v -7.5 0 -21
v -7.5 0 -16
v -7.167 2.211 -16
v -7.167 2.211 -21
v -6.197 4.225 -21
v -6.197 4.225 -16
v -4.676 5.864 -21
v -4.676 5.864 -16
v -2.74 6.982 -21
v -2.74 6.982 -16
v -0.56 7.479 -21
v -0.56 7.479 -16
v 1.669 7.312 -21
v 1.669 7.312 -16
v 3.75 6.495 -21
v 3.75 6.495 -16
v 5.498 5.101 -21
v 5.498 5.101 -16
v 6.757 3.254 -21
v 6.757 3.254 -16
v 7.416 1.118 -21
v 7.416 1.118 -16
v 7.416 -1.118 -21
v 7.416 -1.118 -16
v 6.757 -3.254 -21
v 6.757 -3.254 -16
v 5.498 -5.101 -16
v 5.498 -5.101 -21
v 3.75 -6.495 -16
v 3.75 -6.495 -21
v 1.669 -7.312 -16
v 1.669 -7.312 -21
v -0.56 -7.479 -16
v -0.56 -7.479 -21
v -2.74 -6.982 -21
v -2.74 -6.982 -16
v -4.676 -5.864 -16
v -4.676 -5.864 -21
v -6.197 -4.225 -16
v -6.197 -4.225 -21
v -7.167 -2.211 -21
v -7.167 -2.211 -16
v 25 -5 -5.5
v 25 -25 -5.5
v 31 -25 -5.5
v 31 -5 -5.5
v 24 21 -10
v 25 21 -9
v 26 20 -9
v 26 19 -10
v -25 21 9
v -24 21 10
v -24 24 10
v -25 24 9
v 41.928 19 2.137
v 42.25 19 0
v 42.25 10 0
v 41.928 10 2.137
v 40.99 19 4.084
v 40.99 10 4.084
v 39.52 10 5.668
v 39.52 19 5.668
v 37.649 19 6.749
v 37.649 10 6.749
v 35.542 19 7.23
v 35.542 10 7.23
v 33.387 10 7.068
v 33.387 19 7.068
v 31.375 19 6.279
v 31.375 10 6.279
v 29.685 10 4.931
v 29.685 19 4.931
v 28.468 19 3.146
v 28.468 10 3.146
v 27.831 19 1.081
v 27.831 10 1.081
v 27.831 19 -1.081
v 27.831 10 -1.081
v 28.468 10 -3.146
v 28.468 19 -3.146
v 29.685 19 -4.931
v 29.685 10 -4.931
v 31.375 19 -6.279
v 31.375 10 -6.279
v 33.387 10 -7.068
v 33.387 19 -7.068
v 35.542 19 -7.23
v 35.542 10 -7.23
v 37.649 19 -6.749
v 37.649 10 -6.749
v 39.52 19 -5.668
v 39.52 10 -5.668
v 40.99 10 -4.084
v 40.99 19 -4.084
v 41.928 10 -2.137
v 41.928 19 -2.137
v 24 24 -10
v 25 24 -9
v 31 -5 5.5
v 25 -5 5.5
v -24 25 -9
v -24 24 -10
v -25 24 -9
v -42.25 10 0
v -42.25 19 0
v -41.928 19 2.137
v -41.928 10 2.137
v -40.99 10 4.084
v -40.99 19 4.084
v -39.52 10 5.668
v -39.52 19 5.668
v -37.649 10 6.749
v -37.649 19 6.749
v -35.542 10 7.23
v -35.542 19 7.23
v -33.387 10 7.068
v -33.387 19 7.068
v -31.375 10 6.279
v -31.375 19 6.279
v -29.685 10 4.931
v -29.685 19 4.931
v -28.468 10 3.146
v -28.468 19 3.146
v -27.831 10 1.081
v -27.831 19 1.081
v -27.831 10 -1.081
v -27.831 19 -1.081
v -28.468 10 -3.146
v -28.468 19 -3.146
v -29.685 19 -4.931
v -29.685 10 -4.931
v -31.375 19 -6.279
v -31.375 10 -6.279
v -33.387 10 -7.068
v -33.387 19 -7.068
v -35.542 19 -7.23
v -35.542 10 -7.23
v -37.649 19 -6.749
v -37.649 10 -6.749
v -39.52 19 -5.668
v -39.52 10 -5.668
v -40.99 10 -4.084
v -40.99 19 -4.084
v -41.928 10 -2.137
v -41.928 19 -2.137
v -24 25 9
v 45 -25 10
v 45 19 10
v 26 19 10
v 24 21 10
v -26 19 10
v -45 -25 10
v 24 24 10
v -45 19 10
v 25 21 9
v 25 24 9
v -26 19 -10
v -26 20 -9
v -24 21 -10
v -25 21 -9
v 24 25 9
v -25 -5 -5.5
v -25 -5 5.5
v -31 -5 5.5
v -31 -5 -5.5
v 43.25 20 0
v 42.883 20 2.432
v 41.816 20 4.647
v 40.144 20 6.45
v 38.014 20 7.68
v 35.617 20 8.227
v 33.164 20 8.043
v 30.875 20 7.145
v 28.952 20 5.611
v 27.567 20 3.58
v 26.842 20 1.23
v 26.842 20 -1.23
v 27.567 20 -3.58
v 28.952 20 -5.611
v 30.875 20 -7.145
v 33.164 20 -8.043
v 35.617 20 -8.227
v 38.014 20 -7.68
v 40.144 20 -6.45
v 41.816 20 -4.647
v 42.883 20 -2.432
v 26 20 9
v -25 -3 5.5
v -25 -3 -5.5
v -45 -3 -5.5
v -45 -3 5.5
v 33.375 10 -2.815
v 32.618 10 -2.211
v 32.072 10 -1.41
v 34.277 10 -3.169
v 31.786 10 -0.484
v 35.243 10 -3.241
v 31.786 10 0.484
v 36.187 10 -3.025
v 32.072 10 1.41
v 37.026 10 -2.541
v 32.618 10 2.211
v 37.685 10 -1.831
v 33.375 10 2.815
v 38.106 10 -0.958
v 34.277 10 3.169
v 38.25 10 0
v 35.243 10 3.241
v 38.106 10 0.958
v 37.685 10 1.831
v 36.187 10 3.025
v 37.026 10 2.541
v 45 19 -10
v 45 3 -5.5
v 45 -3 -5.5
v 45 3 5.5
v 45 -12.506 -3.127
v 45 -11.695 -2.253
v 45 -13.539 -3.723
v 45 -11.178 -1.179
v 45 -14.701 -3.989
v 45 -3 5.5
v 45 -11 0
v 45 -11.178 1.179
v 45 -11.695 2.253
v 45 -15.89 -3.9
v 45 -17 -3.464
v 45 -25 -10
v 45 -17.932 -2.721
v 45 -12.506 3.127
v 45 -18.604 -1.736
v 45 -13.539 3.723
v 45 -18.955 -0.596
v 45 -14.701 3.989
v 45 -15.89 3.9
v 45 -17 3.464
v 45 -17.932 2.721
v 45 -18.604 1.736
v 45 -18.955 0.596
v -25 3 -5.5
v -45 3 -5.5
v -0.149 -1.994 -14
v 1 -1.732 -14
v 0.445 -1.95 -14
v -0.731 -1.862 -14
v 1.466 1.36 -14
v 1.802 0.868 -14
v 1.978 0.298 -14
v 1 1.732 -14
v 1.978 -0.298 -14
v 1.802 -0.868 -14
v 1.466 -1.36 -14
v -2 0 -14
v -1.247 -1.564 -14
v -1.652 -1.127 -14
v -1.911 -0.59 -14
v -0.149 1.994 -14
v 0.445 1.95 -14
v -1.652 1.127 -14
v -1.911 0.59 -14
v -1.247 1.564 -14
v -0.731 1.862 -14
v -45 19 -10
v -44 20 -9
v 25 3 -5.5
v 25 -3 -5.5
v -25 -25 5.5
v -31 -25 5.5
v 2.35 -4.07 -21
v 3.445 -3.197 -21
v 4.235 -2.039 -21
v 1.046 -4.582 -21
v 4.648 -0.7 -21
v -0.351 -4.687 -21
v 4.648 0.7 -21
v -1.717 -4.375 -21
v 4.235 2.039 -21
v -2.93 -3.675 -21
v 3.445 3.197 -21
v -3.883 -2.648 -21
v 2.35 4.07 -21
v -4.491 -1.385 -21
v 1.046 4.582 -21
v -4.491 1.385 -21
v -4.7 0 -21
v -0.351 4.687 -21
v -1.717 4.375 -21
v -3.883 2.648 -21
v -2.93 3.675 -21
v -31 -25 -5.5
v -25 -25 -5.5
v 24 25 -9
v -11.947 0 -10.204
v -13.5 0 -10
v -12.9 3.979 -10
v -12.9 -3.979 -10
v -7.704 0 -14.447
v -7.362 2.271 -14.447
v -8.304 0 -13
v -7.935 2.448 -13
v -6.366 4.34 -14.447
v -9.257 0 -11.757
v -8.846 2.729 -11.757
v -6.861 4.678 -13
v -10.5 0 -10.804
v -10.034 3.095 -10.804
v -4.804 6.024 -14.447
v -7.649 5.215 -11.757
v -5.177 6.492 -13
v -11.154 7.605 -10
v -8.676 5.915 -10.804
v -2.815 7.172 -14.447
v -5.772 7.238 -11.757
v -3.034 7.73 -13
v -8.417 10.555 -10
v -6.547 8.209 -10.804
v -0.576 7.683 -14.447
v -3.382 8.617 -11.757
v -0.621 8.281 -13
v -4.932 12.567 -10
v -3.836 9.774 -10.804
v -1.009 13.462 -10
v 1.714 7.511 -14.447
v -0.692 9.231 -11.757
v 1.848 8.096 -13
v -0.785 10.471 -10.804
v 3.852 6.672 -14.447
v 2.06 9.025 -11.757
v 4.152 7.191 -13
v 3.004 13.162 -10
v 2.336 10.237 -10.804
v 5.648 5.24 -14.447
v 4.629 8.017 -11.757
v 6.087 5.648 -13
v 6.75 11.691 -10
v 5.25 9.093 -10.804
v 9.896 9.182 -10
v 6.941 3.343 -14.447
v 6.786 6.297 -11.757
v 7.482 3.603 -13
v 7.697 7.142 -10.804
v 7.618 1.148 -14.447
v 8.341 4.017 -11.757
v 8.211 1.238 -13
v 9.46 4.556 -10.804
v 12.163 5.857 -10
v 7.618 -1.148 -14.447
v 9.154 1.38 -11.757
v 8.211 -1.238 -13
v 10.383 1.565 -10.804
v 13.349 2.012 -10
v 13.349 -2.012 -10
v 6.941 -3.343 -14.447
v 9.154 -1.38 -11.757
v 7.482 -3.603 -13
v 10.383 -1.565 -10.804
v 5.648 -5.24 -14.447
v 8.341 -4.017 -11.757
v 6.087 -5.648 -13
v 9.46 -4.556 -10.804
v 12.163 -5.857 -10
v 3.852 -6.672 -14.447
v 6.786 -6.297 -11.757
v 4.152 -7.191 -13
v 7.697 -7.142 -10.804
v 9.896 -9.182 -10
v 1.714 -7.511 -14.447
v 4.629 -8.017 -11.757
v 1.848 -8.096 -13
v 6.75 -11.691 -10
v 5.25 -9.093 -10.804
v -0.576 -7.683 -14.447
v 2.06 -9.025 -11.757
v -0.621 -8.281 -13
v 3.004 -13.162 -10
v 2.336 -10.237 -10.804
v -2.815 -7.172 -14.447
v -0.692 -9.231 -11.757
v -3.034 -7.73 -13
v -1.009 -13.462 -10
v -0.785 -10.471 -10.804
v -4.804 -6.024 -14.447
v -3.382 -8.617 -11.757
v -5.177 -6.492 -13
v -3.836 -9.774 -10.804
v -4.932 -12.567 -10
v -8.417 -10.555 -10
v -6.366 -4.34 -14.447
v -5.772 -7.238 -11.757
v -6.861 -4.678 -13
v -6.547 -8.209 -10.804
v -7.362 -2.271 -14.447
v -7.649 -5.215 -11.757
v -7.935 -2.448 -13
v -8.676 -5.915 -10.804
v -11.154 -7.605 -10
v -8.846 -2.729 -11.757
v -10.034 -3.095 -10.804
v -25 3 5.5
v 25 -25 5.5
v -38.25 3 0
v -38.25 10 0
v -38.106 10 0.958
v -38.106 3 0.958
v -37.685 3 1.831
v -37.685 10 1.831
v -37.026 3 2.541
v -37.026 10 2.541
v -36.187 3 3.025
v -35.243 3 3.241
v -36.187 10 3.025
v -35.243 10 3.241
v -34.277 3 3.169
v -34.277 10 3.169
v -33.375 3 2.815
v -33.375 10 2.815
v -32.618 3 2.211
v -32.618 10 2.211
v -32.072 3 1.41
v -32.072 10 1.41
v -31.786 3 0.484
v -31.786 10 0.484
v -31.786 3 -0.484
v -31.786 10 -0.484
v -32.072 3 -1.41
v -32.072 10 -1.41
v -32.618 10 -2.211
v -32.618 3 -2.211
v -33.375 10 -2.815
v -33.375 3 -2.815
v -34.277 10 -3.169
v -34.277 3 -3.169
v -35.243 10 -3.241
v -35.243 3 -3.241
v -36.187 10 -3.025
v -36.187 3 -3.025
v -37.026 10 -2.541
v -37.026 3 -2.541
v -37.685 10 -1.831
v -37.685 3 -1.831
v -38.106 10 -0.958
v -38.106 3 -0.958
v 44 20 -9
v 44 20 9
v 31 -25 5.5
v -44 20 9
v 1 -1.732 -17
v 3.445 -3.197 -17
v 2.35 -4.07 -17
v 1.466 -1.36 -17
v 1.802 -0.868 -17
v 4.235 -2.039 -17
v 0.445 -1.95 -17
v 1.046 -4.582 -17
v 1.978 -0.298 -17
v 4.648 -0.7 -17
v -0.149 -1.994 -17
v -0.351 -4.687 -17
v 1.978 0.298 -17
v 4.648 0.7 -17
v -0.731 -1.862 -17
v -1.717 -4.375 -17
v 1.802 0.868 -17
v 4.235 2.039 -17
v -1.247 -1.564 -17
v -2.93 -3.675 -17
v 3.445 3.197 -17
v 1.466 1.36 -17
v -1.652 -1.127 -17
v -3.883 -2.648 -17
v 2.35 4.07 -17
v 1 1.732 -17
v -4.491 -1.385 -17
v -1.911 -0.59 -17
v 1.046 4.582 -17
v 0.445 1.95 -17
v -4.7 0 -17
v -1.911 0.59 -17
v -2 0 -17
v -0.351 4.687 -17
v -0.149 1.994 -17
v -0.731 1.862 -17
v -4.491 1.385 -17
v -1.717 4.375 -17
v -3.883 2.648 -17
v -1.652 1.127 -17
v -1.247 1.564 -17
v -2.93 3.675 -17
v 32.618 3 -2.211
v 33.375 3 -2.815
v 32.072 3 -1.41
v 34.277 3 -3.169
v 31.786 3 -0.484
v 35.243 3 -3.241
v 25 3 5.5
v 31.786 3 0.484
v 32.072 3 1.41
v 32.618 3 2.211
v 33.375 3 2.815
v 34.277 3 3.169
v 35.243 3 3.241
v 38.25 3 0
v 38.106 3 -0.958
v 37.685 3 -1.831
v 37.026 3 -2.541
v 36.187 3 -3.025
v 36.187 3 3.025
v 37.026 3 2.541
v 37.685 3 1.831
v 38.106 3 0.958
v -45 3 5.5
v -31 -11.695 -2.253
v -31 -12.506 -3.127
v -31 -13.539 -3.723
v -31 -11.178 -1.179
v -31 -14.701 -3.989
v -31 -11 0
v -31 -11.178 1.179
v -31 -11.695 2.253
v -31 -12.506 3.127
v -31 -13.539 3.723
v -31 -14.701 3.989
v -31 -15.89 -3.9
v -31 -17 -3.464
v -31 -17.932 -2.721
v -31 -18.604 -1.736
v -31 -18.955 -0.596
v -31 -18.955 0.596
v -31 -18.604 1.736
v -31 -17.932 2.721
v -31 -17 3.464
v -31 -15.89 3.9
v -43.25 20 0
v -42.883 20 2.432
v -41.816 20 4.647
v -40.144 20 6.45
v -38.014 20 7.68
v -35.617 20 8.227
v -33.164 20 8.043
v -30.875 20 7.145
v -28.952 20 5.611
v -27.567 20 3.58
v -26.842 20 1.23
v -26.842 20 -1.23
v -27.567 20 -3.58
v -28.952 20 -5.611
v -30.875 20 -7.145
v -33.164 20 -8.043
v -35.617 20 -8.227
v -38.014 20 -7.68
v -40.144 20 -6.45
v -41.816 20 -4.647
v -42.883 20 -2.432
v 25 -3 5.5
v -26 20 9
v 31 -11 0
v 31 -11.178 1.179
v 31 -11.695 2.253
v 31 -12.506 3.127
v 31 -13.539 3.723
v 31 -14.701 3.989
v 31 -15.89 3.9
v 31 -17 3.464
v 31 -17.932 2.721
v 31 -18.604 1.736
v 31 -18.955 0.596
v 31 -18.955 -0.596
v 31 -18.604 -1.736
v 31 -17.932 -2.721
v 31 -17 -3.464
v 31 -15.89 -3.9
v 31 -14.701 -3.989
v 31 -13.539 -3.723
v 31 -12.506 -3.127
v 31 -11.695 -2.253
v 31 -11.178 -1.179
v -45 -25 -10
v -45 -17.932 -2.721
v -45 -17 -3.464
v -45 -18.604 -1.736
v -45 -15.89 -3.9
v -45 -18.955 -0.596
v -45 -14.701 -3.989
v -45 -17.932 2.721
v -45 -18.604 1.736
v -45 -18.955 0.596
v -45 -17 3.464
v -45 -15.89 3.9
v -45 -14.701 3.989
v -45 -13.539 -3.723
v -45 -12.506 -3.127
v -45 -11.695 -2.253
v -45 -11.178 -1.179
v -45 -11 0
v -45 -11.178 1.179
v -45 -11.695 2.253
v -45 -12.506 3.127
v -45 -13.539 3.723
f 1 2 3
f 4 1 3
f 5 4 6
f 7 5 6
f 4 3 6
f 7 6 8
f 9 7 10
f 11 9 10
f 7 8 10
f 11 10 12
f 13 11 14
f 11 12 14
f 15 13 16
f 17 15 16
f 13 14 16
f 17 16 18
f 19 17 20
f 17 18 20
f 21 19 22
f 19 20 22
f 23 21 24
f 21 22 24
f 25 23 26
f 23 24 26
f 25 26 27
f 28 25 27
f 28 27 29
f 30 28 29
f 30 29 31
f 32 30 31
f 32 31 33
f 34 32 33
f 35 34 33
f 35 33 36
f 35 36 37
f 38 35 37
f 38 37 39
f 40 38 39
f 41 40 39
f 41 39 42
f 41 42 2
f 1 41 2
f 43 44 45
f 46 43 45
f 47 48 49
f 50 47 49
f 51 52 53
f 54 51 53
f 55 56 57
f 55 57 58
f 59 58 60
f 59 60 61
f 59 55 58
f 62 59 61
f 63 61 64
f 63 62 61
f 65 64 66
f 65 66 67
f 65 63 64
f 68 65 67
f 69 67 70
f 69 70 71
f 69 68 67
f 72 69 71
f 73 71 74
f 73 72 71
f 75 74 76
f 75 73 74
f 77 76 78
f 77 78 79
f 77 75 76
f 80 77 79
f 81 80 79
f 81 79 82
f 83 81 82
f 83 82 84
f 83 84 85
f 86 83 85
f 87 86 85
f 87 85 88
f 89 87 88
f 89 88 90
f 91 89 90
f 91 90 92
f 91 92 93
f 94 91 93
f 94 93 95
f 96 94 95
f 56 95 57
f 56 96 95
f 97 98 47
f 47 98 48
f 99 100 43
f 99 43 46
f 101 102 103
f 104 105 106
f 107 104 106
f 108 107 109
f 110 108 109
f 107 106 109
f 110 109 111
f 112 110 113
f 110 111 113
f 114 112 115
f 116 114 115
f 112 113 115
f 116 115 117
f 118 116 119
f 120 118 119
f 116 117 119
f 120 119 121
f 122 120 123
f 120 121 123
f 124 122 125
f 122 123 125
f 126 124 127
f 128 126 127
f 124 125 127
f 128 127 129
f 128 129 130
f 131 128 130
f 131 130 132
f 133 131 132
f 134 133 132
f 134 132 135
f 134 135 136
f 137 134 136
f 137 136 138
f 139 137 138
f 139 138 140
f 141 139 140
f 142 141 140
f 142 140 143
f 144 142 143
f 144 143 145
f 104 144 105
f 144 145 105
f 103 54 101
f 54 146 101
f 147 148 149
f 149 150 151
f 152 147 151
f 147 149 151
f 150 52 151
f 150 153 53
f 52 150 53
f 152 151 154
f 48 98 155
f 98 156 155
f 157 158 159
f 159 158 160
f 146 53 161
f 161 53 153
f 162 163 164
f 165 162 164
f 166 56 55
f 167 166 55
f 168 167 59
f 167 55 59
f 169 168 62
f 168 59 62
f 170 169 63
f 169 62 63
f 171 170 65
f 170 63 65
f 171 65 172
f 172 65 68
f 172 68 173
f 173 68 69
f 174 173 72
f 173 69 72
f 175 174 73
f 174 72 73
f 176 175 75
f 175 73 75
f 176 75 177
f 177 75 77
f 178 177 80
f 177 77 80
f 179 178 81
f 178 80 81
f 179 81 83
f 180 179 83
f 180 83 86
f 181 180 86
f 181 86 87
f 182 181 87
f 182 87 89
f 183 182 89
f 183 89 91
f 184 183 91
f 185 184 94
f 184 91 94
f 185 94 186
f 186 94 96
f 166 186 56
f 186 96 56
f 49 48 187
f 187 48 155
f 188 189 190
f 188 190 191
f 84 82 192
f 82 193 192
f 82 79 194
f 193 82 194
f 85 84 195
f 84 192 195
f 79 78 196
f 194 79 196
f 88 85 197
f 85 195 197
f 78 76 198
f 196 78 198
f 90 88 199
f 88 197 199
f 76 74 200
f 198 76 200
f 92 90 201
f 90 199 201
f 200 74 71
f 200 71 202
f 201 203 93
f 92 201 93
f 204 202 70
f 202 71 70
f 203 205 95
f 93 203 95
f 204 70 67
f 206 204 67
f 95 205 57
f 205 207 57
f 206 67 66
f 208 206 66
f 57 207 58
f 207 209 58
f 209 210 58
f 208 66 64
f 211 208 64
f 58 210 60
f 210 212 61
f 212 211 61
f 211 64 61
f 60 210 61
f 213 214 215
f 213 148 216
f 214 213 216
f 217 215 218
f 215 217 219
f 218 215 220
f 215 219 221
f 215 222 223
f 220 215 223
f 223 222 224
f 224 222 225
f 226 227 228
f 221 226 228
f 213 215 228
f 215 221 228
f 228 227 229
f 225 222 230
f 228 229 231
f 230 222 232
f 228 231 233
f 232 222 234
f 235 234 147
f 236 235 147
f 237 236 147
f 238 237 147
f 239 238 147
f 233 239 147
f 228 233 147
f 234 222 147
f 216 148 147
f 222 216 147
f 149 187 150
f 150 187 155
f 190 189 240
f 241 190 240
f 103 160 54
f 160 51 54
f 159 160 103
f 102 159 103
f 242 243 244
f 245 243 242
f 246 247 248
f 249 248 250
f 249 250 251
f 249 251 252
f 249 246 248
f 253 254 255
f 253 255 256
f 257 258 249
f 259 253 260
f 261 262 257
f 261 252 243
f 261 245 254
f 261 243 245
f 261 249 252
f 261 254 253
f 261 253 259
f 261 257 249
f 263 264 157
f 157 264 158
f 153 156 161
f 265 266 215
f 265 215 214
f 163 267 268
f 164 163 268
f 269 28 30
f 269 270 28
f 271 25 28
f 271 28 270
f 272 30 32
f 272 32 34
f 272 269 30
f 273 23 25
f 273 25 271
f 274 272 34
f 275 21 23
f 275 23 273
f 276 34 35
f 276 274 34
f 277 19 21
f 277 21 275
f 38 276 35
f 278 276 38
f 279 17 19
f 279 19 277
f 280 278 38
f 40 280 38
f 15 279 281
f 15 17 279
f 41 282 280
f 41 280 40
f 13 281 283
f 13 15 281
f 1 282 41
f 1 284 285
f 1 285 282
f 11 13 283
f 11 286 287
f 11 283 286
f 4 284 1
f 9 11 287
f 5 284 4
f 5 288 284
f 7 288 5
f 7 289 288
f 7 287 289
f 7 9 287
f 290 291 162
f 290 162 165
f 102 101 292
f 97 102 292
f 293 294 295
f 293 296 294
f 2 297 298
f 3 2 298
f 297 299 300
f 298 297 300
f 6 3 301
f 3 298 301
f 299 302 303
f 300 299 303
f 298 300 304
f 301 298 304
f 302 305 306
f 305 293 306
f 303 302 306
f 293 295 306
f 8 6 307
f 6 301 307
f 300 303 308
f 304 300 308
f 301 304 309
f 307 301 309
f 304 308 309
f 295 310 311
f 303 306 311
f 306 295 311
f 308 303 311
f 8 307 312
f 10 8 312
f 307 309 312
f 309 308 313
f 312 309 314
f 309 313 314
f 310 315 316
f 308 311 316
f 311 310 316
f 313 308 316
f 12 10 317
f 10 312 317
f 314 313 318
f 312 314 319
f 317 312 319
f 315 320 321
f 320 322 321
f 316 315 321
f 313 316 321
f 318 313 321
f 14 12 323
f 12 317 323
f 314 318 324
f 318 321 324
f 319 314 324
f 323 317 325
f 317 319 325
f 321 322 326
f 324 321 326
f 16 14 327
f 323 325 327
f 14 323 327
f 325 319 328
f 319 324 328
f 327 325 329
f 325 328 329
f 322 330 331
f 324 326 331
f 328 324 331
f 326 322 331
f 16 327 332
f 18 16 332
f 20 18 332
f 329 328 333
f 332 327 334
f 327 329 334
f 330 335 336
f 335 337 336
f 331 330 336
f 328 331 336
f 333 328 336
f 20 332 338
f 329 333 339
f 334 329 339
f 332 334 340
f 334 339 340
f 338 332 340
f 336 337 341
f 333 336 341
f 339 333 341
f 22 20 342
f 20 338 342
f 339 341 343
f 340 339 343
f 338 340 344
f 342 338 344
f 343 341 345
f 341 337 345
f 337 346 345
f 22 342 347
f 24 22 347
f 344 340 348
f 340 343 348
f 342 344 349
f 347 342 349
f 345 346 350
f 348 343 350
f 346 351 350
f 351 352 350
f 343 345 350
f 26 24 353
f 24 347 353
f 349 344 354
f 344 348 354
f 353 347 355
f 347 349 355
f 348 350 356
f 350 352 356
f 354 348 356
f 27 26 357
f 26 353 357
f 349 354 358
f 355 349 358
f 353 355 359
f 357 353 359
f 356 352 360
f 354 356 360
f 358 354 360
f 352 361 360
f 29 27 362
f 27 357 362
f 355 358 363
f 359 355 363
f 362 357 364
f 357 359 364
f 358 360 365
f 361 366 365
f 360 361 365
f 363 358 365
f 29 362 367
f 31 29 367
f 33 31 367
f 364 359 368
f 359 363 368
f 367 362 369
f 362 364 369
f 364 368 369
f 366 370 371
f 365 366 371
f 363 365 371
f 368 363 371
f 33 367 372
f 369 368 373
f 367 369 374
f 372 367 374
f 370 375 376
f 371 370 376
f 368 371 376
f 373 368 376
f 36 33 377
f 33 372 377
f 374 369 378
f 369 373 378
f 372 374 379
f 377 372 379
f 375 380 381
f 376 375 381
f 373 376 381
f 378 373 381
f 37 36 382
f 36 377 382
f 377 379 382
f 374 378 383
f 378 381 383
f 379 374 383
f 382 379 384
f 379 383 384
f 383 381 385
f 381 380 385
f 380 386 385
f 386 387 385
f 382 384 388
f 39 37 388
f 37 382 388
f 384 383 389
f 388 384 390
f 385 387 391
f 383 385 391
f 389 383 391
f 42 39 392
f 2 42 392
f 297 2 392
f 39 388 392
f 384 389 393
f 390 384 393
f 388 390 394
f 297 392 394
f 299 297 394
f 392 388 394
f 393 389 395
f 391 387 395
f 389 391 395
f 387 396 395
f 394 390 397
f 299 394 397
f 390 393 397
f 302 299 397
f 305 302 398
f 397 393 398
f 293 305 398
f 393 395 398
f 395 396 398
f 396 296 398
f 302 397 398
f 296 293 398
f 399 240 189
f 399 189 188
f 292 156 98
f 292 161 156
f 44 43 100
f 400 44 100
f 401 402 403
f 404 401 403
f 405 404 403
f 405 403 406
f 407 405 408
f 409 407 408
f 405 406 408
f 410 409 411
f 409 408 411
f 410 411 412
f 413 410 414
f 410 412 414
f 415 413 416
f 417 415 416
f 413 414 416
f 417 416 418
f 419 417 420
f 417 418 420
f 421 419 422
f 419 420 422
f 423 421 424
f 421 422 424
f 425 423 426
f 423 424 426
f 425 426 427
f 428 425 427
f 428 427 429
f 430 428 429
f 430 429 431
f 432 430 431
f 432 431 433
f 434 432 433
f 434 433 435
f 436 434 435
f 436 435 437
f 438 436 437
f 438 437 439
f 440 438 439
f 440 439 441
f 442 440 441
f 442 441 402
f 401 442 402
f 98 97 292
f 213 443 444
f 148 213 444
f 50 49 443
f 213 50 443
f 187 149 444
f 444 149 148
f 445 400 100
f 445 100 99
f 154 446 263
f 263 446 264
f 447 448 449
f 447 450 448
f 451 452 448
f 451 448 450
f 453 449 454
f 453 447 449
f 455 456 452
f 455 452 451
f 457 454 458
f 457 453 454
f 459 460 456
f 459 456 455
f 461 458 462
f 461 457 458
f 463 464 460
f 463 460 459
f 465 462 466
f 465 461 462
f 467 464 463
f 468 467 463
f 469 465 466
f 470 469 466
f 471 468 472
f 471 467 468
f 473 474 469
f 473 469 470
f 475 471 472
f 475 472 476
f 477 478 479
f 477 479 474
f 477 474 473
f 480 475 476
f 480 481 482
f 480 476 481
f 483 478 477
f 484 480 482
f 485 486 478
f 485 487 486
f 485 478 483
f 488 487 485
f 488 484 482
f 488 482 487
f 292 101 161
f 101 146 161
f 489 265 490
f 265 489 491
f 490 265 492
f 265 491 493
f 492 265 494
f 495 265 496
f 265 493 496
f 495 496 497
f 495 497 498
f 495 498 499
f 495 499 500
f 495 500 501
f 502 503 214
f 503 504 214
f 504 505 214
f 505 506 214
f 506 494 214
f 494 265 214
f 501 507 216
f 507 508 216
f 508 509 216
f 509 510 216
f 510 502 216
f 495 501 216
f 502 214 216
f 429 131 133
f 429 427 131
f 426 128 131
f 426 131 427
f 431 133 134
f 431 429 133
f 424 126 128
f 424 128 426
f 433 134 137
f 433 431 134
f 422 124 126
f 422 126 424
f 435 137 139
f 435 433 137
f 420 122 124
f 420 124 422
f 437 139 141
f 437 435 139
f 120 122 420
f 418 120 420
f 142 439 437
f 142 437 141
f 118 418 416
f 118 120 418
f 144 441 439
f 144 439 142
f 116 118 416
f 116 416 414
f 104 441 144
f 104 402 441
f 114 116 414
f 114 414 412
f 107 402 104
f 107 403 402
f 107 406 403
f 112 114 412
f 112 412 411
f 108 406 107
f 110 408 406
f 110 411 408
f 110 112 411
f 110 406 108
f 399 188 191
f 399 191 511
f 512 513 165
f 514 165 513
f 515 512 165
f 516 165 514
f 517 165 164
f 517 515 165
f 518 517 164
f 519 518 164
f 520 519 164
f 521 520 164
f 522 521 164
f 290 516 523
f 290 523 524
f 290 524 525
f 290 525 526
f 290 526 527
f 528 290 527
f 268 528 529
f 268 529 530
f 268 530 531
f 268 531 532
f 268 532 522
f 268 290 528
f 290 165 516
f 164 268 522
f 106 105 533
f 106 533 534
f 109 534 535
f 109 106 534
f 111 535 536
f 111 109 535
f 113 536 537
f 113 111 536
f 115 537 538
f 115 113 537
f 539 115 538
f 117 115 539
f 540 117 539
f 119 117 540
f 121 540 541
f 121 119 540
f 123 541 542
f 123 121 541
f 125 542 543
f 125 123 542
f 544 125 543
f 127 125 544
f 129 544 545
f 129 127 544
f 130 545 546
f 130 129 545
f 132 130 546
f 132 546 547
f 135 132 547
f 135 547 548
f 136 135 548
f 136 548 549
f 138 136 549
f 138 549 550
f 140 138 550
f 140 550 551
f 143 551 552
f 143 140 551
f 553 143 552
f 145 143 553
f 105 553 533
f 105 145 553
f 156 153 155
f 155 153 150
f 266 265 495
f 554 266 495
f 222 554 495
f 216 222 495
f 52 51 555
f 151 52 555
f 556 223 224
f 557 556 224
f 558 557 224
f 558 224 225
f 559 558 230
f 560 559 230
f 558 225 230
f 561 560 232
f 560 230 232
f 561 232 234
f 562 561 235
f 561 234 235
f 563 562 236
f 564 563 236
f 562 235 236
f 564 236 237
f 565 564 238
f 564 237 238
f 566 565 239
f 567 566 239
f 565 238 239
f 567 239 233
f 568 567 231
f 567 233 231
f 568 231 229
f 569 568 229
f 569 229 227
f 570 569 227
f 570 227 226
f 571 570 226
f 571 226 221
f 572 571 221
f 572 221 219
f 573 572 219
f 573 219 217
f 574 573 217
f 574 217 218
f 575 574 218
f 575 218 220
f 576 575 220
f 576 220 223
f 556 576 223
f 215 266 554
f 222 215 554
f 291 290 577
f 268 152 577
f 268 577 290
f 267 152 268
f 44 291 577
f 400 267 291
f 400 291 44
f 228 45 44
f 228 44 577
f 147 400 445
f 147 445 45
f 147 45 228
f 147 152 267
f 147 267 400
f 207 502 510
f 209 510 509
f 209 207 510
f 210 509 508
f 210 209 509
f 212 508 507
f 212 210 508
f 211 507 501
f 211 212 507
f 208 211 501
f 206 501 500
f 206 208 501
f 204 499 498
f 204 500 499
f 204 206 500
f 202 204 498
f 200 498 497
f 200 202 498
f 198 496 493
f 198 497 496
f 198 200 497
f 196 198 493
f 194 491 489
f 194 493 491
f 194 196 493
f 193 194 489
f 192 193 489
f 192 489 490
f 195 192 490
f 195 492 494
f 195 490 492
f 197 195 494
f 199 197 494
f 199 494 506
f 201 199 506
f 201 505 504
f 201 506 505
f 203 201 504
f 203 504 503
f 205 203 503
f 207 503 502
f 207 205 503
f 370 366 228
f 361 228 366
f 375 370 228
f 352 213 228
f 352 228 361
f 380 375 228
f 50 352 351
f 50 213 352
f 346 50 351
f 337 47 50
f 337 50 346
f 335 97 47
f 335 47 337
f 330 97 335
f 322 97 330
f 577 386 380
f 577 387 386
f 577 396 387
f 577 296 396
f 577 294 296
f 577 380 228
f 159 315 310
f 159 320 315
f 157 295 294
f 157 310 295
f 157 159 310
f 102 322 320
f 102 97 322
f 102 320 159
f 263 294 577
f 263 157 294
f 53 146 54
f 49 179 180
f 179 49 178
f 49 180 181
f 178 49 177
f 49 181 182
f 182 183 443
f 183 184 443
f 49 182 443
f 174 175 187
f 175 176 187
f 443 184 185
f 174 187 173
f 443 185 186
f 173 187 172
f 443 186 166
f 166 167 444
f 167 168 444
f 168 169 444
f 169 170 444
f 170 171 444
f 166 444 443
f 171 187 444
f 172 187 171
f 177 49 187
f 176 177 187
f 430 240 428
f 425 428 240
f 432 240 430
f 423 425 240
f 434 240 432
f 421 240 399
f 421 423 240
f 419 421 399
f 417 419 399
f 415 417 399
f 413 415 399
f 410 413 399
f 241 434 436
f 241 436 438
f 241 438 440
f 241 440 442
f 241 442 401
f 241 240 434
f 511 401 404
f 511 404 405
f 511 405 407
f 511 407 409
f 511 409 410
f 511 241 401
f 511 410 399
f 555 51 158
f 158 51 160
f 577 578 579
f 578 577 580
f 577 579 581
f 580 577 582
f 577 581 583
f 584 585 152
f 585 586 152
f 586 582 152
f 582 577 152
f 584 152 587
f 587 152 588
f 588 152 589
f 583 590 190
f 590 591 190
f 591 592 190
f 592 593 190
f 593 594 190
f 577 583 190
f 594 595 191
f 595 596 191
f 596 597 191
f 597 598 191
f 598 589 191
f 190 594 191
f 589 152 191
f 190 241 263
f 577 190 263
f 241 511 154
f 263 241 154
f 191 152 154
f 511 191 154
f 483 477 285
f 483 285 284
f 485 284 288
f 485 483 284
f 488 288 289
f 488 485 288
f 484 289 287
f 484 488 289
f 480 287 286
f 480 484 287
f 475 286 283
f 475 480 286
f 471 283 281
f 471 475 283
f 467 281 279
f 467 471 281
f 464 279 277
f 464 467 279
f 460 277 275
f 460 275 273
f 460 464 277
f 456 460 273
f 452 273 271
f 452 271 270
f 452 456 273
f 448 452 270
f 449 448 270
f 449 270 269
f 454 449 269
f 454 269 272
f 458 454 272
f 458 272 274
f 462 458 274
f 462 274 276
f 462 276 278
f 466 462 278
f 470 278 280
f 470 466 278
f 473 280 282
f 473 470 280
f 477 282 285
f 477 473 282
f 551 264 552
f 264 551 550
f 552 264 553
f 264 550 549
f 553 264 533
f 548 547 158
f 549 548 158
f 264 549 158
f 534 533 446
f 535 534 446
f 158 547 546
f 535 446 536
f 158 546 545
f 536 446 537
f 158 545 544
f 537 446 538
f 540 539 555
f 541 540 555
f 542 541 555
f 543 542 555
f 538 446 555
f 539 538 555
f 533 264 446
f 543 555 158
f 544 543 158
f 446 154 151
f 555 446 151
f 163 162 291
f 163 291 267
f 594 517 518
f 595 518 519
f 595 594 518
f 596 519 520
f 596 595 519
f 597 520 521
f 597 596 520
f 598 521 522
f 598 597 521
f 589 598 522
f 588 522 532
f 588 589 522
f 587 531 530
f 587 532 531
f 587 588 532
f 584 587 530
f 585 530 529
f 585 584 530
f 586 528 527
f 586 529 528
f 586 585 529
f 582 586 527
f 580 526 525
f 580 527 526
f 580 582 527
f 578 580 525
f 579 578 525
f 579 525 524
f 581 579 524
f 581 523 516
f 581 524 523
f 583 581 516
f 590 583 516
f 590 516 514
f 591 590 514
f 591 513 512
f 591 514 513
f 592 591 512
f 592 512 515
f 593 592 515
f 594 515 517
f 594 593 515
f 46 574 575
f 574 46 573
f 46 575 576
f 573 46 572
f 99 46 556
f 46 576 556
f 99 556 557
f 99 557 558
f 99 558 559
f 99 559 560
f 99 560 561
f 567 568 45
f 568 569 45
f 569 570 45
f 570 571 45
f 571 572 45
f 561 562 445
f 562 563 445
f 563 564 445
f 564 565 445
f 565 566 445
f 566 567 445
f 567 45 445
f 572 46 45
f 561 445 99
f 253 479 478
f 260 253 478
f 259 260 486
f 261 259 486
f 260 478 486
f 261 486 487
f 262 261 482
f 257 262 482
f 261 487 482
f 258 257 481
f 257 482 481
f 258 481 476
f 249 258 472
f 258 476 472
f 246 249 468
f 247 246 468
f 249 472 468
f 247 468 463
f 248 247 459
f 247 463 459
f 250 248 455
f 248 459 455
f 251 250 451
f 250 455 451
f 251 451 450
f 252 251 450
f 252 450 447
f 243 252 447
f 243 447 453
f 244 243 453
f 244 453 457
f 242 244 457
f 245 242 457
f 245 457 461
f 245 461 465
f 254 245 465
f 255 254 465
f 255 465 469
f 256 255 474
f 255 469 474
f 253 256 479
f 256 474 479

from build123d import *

# Parameters (mm, degrees)
BODY_DEPTH             = 10
SKETCH14_R             = 7.5
BEARING_SUPPORT_DEPTH  = 7
SKETCH15_R             = 7.5
SKETCH15_R_2           = 4.7
BEARING_PLACE_DEPTH    = 4
SKETCH16_R             = 2
MOTOR_SHAFT_HOLE_DEPTH = 3
FILLET1_R              = 6
SKETCH17_R             = 7.25
SPRING_HOLE_DEPTH      = 10
SKETCH18_W             = 11
SKETCH18_H             = 6
NUT_HOLE_DEPTH         = 20
SKETCH19_R             = 3.25
SHAFT_HOLE_DEPTH       = 13
SKETCH20_R             = 4
BRAKE_SCREW_HOLE_DEPTH = 20
SKETCH21_W             = 6
SKETCH21_H             = 11
BRAKE_NUT_HOLE_DEPTH   = 20
CHAMFER1_SIZE          = 1


with BuildPart() as part:
    # Sketch1 → Body (new, symmetric)
    with BuildSketch(Plane.XY):
        Polygon((25, -25), (-25, -25), (-45, -25), (-45, 20), (-25, 20), (-25, 25), (25, 25), (25, 20), (45, 20), (45, -25), align=None)
    extrude(amount=BODY_DEPTH, both=True)

    # Sketch14 → Bearing_Support (add)
    with BuildSketch(Plane(origin=(0, 0, -10), x_dir=(-1, 0, 0), z_dir=(0, 0, -1))):
        Circle(SKETCH14_R)
    extrude(amount=BEARING_SUPPORT_DEPTH)

    # Sketch15 → Bearing_Place (add)
    with BuildSketch(Plane(origin=(0, 0, -17), x_dir=(-1, 0, 0), z_dir=(0, 0, -1))):
        Circle(SKETCH15_R)
        Circle(SKETCH15_R_2, mode=Mode.SUBTRACT)
    extrude(amount=BEARING_PLACE_DEPTH)

    # Sketch16 → Motor_Shaft_Hole (cut)
    with BuildSketch(Plane(origin=(0, 0, -17), x_dir=(-1, 0, 0), z_dir=(0, 0, -1))):
        Circle(SKETCH16_R)
    extrude(amount=-MOTOR_SHAFT_HOLE_DEPTH, mode=Mode.SUBTRACT)

    # Fillet1
    fillet1_edges = [part.edges().sort_by_distance(p)[0] for p in [
        (7.5, 0, -10),
    ]]
    fillet(fillet1_edges, radius=FILLET1_R)

    # Sketch17 → Spring_Hole (cut)
    with BuildSketch(Plane(origin=(0, 20, 0), x_dir=(1, 0, 0), z_dir=(0, 1, 0))):
        with Locations(Location((-35, 0, 0), (0, 0, 180))):
            Circle(SKETCH17_R)
    spring_hole = extrude(amount=-SPRING_HOLE_DEPTH, mode=Mode.SUBTRACT)

    # Sketch18 → Nut_Hole (cut)
    with BuildSketch(Plane.ZY.offset(45)):
        Rectangle(SKETCH18_W, SKETCH18_H)
    nut_hole = extrude(amount=-NUT_HOLE_DEPTH, mode=Mode.SUBTRACT)

    # Sketch19 → Shaft_Hole (cut)
    with BuildSketch(Plane(origin=(0, 10, 0), x_dir=(1, 0, 0), z_dir=(0, 1, 0))):
        with Locations(Location((-35, 0, 0), (0, 0, 180))):
            Circle(SKETCH19_R)
    shaft_hole = extrude(amount=-SHAFT_HOLE_DEPTH, mode=Mode.SUBTRACT)

    # Sketch20 → Brake_Screw_Hole (cut)
    with BuildSketch(Plane(origin=(45, 0, 0), x_dir=(0, 0, -1), z_dir=(1, 0, 0))):
        with Locations(Location((0, -15, 0), (0, 0, 90))):
            Circle(SKETCH20_R)
    brake_screw_hole = extrude(amount=-BRAKE_SCREW_HOLE_DEPTH, mode=Mode.SUBTRACT)

    # Sketch21 → Brake_Nut_Hole (cut)
    with BuildSketch(Plane.XZ.offset(25)):
        with Locations((28, 0)):
            Rectangle(SKETCH21_W, SKETCH21_H)
    brake_nut_hole = extrude(amount=-BRAKE_NUT_HOLE_DEPTH, mode=Mode.SUBTRACT)

    # Mirror1: Spring_Hole, Nut_Hole, Shaft_Hole, Brake_Screw_Hole, Brake_Nut_Hole across plane
    add(spring_hole.mirror(Plane(origin=(0, 0, 0), x_dir=(0, 0, 1), z_dir=(1, 0, 0))), mode=Mode.SUBTRACT)
    add(nut_hole.mirror(Plane(origin=(0, 0, 0), x_dir=(0, 0, 1), z_dir=(1, 0, 0))), mode=Mode.SUBTRACT)
    add(shaft_hole.mirror(Plane(origin=(0, 0, 0), x_dir=(0, 0, 1), z_dir=(1, 0, 0))), mode=Mode.SUBTRACT)
    add(brake_screw_hole.mirror(Plane(origin=(0, 0, 0), x_dir=(0, 0, 1), z_dir=(1, 0, 0))), mode=Mode.SUBTRACT)
    add(brake_nut_hole.mirror(Plane(origin=(0, 0, 0), x_dir=(0, 0, 1), z_dir=(1, 0, 0))), mode=Mode.SUBTRACT)

    # Chamfer1
    chamfer1_edges = [part.edges().sort_by_distance(p)[0] for p in [
        (25, 22.5, -10),
        (35, 20, -10),
        (-35, 20, 10),
        (-35, 20, -10),
        (-25, 22.5, -10),
        (0, 25, -10),
        (25, 25, 0),
        (25, 20, 0),
        (45, 20, 0),
        (-45, 20, 0),
        (-25, 20, 0),
        (-25, 25, 0),
        (35, 20, 10),
        (25, 22.5, 10),
        (0, 25, 10),
        (-27.75, 20, 0),
        (-25, 22.5, 10),
        (27.75, 20, 0),
    ]]
    chamfer(chamfer1_edges, length=CHAMFER1_SIZE)


solid = part.part
